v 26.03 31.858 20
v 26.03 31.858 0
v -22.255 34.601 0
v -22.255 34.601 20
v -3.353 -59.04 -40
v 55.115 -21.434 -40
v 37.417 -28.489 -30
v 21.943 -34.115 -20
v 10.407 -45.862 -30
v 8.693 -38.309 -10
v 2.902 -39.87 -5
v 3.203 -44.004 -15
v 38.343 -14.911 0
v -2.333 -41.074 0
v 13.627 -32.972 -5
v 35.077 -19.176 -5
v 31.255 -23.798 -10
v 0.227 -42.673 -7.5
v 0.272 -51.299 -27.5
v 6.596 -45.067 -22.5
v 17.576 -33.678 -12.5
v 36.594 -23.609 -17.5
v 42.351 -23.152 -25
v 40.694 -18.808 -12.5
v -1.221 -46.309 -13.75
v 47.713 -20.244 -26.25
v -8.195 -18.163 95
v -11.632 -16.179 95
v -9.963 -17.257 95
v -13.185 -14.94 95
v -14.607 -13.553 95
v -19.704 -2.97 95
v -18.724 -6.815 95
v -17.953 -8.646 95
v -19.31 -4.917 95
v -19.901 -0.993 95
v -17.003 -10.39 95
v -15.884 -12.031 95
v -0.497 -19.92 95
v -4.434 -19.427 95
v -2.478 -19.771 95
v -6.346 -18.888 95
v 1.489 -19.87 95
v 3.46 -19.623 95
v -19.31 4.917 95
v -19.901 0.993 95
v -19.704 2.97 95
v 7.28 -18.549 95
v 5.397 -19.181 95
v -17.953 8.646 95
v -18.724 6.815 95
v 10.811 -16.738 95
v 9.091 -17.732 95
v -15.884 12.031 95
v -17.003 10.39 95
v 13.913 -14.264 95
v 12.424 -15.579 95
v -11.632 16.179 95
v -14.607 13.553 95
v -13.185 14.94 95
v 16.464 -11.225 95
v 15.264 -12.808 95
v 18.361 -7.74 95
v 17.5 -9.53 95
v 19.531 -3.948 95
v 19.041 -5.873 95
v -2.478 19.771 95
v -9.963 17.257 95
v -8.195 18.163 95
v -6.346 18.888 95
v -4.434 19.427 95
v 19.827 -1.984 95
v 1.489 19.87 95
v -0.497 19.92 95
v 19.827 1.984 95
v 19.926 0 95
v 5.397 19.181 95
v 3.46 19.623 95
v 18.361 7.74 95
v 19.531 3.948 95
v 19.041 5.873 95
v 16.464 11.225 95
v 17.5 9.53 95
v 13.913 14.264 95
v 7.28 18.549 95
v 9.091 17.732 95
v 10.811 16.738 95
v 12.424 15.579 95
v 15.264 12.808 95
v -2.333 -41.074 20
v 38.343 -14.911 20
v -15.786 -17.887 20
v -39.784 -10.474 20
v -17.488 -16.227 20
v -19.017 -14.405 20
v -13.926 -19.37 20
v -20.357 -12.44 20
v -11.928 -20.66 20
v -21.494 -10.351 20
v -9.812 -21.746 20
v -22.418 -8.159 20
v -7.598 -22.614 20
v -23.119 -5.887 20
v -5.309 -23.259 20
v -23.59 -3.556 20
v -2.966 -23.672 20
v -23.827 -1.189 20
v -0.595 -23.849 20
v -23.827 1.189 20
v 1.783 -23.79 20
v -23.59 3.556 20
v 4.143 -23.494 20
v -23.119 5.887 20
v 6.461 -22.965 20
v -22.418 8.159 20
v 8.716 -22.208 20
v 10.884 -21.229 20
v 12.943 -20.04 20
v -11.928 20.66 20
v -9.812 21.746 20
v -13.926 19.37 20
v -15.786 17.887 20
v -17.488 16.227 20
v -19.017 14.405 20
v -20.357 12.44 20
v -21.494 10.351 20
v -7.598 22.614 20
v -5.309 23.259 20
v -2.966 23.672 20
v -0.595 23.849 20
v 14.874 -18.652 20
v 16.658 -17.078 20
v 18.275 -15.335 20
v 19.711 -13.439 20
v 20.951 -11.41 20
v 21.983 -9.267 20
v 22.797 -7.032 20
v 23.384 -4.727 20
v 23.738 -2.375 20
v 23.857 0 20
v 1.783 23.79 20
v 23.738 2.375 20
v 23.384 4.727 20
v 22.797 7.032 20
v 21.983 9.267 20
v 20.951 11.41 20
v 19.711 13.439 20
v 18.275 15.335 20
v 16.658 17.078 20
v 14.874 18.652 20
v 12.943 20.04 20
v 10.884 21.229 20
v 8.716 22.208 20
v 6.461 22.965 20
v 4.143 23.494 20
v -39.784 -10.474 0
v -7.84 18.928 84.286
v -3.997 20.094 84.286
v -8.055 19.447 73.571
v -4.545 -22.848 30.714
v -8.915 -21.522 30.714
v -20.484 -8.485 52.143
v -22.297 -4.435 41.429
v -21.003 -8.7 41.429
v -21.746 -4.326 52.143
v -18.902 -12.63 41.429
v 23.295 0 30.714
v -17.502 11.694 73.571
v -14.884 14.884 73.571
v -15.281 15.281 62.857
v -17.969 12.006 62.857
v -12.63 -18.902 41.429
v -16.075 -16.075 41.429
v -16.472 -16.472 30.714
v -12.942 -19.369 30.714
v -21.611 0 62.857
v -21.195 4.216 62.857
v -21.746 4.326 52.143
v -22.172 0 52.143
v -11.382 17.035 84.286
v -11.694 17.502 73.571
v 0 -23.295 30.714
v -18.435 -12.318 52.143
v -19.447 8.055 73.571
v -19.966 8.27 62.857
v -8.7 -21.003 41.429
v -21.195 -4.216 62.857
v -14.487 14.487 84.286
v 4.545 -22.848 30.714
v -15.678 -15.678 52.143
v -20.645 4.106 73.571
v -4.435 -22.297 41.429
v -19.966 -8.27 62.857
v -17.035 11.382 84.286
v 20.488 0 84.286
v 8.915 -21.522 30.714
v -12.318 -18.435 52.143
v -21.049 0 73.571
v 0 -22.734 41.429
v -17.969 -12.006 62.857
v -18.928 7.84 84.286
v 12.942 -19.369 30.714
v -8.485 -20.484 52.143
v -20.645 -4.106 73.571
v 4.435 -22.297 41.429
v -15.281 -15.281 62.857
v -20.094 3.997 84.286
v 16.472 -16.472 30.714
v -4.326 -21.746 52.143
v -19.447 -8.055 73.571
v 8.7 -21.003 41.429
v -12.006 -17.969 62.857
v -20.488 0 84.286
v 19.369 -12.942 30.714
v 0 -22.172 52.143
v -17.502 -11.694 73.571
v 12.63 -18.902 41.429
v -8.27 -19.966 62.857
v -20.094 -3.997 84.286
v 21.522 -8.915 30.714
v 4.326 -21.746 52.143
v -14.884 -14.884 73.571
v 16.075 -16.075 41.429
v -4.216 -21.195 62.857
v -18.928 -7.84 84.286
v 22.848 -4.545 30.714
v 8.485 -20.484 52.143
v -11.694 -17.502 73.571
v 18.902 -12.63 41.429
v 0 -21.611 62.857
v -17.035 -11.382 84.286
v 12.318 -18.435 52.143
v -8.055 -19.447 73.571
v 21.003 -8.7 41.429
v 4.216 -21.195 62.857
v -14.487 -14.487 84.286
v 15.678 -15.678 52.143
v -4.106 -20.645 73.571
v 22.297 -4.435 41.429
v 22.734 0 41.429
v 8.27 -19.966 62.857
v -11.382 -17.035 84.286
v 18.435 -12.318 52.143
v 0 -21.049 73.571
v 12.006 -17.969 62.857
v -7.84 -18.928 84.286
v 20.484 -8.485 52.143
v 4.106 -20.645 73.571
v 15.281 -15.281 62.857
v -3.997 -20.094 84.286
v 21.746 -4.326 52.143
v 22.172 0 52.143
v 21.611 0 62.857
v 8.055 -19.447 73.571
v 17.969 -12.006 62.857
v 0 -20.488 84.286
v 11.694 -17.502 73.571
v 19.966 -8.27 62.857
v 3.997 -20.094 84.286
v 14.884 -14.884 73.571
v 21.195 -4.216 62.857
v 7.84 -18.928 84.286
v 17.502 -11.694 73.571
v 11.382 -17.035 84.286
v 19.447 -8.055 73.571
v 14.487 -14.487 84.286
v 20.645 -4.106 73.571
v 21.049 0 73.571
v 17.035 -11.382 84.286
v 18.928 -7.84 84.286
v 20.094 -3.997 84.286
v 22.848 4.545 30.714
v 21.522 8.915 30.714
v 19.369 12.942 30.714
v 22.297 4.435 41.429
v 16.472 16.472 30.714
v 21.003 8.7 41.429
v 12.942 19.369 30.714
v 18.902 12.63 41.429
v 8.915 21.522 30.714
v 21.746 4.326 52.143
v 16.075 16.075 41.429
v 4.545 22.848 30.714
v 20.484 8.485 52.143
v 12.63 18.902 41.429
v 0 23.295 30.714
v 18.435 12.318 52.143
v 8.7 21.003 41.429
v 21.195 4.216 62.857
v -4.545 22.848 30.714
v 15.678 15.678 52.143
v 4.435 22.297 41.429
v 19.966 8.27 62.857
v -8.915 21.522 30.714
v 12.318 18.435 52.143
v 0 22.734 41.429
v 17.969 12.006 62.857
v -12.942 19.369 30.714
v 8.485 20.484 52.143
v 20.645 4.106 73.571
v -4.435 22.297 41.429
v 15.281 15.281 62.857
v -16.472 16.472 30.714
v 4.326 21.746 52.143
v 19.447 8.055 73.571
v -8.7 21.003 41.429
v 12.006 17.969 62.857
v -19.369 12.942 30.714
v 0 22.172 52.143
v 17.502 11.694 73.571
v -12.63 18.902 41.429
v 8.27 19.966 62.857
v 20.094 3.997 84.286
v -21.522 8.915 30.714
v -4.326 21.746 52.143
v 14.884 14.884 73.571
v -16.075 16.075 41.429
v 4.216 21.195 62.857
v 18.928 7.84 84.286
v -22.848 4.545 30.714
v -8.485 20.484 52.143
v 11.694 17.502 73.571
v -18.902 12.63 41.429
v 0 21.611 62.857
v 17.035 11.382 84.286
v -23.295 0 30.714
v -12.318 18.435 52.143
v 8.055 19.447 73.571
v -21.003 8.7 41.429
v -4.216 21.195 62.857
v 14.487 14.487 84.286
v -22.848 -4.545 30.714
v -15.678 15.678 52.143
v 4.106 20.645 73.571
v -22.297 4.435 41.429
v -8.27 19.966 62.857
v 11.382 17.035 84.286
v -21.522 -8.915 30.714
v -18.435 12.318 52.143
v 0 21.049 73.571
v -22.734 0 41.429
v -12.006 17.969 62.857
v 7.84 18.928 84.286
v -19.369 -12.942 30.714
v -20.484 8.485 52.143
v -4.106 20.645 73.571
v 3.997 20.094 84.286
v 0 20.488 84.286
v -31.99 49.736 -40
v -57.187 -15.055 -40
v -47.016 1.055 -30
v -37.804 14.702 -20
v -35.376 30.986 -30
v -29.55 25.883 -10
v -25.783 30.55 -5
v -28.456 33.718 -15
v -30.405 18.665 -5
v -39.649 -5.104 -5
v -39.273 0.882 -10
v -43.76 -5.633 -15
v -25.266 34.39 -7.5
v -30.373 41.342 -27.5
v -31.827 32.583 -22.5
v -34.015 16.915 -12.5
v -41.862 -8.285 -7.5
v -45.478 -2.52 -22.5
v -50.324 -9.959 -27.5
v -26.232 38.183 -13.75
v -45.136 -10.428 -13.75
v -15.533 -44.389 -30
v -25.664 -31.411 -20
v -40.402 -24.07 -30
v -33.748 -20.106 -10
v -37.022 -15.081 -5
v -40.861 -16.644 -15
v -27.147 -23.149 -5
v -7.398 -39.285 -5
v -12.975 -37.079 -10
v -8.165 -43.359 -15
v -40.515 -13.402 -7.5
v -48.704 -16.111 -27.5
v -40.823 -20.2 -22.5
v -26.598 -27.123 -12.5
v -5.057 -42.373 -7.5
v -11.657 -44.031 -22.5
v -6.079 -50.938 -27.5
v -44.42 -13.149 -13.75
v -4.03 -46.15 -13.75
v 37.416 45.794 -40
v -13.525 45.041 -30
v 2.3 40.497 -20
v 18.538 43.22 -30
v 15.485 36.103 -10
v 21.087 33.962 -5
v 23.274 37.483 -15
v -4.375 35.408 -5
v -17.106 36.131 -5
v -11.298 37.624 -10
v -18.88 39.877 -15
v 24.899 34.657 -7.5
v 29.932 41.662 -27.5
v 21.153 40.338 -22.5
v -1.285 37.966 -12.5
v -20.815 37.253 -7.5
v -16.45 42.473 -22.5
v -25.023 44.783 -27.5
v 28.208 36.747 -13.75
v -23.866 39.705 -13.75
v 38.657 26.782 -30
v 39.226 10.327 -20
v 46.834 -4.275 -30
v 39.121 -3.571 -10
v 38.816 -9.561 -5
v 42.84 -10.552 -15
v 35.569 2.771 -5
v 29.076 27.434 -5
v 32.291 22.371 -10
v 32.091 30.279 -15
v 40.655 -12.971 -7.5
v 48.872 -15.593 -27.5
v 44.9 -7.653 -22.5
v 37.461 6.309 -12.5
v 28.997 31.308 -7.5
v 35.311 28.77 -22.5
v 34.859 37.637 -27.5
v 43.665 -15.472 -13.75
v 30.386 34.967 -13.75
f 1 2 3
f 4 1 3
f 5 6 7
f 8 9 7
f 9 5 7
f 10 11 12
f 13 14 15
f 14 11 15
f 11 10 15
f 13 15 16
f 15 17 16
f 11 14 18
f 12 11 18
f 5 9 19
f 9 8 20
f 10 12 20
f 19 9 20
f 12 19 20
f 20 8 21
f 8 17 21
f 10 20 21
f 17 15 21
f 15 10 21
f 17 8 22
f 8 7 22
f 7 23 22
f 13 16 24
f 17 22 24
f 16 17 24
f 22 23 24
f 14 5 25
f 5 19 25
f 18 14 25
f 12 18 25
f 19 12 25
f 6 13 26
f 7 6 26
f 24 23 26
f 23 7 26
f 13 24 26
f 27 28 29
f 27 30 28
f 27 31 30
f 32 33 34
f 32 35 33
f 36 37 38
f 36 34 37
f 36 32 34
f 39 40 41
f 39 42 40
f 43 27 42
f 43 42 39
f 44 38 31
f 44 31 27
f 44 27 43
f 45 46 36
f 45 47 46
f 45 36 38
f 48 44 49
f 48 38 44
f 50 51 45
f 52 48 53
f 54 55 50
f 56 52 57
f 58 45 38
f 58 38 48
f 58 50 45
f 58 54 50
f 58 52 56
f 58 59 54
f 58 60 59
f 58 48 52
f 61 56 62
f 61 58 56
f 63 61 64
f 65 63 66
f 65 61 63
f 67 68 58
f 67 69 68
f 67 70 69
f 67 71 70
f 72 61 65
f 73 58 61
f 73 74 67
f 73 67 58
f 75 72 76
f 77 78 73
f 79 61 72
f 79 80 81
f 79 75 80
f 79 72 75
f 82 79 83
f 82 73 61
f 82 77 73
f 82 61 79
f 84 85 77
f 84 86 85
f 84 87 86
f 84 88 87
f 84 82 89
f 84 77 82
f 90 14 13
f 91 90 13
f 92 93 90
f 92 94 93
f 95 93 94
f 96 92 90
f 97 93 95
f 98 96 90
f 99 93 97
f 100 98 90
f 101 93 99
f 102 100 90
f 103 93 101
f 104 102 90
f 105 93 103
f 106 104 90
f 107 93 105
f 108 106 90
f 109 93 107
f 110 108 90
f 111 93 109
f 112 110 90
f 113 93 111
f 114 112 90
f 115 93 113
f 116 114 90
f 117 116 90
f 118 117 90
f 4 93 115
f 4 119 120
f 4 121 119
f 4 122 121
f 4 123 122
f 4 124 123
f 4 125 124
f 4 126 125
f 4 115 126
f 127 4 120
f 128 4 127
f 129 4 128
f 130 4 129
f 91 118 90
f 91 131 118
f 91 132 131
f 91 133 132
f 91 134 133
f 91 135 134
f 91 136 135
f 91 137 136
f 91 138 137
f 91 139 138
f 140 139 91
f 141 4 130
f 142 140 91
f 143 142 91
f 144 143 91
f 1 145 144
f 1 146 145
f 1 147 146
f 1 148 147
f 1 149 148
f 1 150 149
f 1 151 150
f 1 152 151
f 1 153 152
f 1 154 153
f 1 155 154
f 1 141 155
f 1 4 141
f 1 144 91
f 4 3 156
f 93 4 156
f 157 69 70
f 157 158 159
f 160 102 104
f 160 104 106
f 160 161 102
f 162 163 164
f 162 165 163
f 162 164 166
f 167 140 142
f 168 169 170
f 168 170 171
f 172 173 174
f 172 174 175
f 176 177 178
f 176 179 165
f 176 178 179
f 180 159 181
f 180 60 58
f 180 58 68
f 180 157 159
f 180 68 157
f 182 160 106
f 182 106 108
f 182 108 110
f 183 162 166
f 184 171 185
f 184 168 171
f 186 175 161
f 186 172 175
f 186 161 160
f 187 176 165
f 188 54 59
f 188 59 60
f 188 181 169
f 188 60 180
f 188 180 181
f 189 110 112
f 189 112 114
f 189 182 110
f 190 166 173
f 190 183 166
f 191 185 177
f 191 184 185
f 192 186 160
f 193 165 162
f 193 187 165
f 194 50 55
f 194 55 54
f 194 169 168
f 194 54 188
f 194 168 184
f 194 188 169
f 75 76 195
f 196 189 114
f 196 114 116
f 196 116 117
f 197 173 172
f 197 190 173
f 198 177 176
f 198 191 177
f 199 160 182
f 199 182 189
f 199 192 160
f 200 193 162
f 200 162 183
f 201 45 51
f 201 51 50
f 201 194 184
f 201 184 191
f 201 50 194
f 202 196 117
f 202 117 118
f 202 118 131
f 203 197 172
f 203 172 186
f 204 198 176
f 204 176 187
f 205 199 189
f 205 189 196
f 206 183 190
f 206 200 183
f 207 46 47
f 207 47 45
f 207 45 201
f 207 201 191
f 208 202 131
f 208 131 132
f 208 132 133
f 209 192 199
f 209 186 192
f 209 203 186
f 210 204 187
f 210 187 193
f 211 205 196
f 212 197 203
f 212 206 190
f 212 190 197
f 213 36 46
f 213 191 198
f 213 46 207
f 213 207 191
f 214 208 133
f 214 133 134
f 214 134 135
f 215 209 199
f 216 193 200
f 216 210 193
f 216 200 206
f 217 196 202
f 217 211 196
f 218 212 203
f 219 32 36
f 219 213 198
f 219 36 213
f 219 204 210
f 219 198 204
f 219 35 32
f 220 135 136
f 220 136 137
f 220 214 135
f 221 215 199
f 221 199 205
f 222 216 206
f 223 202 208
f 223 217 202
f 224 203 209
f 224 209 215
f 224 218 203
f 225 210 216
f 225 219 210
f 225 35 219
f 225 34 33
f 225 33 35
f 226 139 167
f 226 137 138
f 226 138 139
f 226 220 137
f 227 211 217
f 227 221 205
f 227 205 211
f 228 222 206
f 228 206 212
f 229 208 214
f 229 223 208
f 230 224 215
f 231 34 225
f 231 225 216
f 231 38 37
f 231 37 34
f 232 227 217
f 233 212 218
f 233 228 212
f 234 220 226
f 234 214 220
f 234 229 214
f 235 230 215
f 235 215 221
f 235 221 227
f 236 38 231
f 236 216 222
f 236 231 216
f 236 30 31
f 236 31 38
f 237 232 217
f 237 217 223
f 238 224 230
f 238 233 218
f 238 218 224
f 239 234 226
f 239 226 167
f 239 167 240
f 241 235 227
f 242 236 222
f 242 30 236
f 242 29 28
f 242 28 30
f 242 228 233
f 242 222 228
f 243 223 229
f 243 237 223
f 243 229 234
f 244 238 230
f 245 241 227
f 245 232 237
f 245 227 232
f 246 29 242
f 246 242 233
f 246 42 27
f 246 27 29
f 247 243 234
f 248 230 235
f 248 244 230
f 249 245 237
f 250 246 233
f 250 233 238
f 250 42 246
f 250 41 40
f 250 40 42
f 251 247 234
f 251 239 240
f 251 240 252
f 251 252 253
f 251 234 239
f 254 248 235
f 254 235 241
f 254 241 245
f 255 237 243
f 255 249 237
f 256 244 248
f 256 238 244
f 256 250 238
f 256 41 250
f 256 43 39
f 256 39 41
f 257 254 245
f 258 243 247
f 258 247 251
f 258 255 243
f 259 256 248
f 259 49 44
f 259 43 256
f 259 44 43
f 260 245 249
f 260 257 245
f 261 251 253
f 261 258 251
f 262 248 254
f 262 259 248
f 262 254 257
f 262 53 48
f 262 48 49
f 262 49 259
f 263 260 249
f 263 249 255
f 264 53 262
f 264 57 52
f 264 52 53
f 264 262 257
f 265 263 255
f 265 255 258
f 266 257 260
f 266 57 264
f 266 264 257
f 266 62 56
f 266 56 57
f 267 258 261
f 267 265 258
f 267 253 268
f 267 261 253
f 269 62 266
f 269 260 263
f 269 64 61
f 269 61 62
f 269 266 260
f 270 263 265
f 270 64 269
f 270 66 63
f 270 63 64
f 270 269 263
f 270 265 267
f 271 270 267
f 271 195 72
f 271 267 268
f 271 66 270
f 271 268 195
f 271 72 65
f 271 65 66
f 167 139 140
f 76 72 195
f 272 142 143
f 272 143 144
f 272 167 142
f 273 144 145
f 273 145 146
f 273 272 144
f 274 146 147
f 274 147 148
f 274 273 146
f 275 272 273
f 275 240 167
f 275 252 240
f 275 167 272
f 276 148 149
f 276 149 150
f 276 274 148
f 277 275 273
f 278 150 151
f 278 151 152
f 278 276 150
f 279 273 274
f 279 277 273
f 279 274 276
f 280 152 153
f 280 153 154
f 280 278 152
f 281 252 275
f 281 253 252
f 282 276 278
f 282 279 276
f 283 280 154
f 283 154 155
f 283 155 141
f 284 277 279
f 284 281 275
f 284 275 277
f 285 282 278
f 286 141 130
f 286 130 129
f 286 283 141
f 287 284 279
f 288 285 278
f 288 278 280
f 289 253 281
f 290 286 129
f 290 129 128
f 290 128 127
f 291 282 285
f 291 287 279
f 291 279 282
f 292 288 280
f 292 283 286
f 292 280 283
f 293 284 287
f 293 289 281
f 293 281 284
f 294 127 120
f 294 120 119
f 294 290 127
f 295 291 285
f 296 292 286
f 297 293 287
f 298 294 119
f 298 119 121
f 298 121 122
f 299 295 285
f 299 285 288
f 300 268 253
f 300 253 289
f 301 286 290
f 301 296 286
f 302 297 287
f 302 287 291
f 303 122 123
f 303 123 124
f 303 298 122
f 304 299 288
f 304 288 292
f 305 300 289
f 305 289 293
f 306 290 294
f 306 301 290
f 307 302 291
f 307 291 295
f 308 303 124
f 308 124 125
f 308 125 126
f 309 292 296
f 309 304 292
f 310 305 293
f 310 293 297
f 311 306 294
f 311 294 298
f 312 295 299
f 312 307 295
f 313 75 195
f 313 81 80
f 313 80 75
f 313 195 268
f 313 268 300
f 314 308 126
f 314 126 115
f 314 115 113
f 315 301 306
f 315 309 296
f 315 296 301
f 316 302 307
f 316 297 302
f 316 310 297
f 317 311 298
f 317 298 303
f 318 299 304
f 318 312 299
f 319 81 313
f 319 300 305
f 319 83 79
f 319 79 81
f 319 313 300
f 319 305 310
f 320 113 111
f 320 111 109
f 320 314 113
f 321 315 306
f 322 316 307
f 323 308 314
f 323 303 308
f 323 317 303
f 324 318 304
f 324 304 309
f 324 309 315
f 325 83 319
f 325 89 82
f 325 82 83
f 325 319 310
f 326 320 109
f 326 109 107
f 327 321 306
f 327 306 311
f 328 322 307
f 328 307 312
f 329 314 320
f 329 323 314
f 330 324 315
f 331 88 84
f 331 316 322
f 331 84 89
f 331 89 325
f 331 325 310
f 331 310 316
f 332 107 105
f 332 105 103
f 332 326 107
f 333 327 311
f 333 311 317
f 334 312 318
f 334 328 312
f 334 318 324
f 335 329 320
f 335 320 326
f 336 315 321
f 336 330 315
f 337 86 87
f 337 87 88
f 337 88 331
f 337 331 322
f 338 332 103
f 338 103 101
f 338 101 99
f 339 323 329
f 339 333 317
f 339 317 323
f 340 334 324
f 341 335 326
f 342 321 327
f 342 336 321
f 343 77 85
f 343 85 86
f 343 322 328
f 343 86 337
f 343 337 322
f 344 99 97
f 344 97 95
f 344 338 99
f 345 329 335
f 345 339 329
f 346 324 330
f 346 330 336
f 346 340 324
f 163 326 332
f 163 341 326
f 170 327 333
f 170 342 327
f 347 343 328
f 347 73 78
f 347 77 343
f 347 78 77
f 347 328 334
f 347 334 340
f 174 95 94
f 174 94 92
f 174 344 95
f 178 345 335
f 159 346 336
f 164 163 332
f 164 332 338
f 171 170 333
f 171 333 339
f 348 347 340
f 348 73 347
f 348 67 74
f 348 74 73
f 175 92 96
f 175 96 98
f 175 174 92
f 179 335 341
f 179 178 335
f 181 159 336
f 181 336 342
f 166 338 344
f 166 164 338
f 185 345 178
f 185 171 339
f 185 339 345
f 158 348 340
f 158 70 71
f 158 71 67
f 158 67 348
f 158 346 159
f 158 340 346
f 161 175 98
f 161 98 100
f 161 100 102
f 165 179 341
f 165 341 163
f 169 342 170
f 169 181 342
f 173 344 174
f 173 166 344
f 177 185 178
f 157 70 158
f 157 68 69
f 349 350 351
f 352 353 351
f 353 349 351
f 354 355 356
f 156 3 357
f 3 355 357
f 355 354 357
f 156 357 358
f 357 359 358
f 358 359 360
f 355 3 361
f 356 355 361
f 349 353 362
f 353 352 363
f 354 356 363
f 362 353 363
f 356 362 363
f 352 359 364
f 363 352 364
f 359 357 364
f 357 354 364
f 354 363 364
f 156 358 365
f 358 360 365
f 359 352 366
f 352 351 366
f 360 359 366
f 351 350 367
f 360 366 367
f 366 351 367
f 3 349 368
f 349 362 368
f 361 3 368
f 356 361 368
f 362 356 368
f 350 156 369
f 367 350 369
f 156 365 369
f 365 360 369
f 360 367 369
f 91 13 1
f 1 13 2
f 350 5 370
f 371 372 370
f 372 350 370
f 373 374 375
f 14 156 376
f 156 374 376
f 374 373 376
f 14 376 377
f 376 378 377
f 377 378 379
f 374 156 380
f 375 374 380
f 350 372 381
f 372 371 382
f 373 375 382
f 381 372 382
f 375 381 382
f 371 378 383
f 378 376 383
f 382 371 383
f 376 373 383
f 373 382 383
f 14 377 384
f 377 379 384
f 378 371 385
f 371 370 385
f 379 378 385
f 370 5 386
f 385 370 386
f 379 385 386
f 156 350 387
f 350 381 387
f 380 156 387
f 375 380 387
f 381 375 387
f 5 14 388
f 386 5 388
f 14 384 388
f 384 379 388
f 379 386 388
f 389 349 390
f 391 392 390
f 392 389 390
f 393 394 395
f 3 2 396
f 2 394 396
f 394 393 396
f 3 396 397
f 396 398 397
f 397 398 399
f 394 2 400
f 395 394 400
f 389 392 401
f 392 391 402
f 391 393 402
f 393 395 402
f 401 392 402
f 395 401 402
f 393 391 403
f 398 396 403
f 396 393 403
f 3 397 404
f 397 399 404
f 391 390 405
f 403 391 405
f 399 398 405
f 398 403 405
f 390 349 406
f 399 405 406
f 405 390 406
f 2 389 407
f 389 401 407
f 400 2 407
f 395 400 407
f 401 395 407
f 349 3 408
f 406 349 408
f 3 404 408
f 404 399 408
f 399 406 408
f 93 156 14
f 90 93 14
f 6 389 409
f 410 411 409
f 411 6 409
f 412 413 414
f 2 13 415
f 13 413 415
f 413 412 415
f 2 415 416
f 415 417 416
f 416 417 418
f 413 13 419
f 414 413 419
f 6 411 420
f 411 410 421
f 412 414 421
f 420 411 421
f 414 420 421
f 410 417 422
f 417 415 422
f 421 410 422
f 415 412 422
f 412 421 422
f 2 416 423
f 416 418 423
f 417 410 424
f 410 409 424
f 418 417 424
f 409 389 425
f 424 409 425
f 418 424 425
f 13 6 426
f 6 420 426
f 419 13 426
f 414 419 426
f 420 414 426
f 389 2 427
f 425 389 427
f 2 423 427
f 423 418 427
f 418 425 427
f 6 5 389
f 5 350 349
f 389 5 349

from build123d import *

# Parameters (mm, degrees)
F1_DEPTH      = 40
F1_TAPER      = -20
F1_DEPTH_BACK = 20
F2_R          = 24.9048411139
F3_DEPTH      = 95
F3_TAPER      = 3


with BuildPart() as f1:
    # F0 (on Top) → F1 (new body, two sides)
    with BuildSketch(Plane.XY) as f1_sk:
        Polygon((-2.332799099, -41.0736999903), (38.3425354581, -14.9110951032), (26.029789227, 31.8581364071), (-22.2552409959, 34.600506221), (-39.7842845902, -10.4738475346), align=None)
    extrude(amount=-F1_DEPTH, taper=F1_TAPER)
    extrude(f1_sk.sketch, amount=F1_DEPTH_BACK)

    # F2 (on Top) → F3 (join)
    with BuildSketch(Plane.XY):
        Circle(F2_R)
    extrude(amount=F3_DEPTH, taper=F3_TAPER)


solid = f1.part
